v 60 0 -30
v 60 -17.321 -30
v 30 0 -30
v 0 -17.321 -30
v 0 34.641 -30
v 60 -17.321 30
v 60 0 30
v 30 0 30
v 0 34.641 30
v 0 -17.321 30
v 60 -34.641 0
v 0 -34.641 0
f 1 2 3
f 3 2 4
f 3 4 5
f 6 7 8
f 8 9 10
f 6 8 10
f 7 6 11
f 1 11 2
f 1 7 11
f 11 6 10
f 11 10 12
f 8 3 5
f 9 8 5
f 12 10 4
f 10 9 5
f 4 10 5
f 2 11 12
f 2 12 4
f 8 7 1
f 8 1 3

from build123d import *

# Parameters (mm, degrees)
EXTRUDE_2_DEPTH          = 60
CUT_EXTRUDE_2_DEPTH      = 76.498344353
CUT_EXTRUDE_2_DEPTH_BACK = 76.498344353


with BuildPart() as part:
    # Эскиз1 → Бобышка-Вытянуть2 (new body)
    with BuildSketch(Plane(origin=(0, 0, 0), x_dir=(0, 0, -1), z_dir=(1, 0, 0))):
        Polygon((-30, 34.641016151), (-30, -17.320508076), (0, -34.641016151), (30, -17.320508076), (30, 34.641016151), align=None)
    extrude(amount=EXTRUDE_2_DEPTH)

    # Эскиз3 → Вырез-Вытянуть2 (cut, two sides: drawn at the far end of the back side and taken through both)
    with BuildSketch(Plane.XY.offset(-CUT_EXTRUDE_2_DEPTH_BACK)):
        Polygon((60, 0), (30, 0), (0, 34.641016151), (60, 34.641016151), align=None)
    extrude(amount=CUT_EXTRUDE_2_DEPTH + CUT_EXTRUDE_2_DEPTH_BACK, mode=Mode.SUBTRACT)


solid = part.part
